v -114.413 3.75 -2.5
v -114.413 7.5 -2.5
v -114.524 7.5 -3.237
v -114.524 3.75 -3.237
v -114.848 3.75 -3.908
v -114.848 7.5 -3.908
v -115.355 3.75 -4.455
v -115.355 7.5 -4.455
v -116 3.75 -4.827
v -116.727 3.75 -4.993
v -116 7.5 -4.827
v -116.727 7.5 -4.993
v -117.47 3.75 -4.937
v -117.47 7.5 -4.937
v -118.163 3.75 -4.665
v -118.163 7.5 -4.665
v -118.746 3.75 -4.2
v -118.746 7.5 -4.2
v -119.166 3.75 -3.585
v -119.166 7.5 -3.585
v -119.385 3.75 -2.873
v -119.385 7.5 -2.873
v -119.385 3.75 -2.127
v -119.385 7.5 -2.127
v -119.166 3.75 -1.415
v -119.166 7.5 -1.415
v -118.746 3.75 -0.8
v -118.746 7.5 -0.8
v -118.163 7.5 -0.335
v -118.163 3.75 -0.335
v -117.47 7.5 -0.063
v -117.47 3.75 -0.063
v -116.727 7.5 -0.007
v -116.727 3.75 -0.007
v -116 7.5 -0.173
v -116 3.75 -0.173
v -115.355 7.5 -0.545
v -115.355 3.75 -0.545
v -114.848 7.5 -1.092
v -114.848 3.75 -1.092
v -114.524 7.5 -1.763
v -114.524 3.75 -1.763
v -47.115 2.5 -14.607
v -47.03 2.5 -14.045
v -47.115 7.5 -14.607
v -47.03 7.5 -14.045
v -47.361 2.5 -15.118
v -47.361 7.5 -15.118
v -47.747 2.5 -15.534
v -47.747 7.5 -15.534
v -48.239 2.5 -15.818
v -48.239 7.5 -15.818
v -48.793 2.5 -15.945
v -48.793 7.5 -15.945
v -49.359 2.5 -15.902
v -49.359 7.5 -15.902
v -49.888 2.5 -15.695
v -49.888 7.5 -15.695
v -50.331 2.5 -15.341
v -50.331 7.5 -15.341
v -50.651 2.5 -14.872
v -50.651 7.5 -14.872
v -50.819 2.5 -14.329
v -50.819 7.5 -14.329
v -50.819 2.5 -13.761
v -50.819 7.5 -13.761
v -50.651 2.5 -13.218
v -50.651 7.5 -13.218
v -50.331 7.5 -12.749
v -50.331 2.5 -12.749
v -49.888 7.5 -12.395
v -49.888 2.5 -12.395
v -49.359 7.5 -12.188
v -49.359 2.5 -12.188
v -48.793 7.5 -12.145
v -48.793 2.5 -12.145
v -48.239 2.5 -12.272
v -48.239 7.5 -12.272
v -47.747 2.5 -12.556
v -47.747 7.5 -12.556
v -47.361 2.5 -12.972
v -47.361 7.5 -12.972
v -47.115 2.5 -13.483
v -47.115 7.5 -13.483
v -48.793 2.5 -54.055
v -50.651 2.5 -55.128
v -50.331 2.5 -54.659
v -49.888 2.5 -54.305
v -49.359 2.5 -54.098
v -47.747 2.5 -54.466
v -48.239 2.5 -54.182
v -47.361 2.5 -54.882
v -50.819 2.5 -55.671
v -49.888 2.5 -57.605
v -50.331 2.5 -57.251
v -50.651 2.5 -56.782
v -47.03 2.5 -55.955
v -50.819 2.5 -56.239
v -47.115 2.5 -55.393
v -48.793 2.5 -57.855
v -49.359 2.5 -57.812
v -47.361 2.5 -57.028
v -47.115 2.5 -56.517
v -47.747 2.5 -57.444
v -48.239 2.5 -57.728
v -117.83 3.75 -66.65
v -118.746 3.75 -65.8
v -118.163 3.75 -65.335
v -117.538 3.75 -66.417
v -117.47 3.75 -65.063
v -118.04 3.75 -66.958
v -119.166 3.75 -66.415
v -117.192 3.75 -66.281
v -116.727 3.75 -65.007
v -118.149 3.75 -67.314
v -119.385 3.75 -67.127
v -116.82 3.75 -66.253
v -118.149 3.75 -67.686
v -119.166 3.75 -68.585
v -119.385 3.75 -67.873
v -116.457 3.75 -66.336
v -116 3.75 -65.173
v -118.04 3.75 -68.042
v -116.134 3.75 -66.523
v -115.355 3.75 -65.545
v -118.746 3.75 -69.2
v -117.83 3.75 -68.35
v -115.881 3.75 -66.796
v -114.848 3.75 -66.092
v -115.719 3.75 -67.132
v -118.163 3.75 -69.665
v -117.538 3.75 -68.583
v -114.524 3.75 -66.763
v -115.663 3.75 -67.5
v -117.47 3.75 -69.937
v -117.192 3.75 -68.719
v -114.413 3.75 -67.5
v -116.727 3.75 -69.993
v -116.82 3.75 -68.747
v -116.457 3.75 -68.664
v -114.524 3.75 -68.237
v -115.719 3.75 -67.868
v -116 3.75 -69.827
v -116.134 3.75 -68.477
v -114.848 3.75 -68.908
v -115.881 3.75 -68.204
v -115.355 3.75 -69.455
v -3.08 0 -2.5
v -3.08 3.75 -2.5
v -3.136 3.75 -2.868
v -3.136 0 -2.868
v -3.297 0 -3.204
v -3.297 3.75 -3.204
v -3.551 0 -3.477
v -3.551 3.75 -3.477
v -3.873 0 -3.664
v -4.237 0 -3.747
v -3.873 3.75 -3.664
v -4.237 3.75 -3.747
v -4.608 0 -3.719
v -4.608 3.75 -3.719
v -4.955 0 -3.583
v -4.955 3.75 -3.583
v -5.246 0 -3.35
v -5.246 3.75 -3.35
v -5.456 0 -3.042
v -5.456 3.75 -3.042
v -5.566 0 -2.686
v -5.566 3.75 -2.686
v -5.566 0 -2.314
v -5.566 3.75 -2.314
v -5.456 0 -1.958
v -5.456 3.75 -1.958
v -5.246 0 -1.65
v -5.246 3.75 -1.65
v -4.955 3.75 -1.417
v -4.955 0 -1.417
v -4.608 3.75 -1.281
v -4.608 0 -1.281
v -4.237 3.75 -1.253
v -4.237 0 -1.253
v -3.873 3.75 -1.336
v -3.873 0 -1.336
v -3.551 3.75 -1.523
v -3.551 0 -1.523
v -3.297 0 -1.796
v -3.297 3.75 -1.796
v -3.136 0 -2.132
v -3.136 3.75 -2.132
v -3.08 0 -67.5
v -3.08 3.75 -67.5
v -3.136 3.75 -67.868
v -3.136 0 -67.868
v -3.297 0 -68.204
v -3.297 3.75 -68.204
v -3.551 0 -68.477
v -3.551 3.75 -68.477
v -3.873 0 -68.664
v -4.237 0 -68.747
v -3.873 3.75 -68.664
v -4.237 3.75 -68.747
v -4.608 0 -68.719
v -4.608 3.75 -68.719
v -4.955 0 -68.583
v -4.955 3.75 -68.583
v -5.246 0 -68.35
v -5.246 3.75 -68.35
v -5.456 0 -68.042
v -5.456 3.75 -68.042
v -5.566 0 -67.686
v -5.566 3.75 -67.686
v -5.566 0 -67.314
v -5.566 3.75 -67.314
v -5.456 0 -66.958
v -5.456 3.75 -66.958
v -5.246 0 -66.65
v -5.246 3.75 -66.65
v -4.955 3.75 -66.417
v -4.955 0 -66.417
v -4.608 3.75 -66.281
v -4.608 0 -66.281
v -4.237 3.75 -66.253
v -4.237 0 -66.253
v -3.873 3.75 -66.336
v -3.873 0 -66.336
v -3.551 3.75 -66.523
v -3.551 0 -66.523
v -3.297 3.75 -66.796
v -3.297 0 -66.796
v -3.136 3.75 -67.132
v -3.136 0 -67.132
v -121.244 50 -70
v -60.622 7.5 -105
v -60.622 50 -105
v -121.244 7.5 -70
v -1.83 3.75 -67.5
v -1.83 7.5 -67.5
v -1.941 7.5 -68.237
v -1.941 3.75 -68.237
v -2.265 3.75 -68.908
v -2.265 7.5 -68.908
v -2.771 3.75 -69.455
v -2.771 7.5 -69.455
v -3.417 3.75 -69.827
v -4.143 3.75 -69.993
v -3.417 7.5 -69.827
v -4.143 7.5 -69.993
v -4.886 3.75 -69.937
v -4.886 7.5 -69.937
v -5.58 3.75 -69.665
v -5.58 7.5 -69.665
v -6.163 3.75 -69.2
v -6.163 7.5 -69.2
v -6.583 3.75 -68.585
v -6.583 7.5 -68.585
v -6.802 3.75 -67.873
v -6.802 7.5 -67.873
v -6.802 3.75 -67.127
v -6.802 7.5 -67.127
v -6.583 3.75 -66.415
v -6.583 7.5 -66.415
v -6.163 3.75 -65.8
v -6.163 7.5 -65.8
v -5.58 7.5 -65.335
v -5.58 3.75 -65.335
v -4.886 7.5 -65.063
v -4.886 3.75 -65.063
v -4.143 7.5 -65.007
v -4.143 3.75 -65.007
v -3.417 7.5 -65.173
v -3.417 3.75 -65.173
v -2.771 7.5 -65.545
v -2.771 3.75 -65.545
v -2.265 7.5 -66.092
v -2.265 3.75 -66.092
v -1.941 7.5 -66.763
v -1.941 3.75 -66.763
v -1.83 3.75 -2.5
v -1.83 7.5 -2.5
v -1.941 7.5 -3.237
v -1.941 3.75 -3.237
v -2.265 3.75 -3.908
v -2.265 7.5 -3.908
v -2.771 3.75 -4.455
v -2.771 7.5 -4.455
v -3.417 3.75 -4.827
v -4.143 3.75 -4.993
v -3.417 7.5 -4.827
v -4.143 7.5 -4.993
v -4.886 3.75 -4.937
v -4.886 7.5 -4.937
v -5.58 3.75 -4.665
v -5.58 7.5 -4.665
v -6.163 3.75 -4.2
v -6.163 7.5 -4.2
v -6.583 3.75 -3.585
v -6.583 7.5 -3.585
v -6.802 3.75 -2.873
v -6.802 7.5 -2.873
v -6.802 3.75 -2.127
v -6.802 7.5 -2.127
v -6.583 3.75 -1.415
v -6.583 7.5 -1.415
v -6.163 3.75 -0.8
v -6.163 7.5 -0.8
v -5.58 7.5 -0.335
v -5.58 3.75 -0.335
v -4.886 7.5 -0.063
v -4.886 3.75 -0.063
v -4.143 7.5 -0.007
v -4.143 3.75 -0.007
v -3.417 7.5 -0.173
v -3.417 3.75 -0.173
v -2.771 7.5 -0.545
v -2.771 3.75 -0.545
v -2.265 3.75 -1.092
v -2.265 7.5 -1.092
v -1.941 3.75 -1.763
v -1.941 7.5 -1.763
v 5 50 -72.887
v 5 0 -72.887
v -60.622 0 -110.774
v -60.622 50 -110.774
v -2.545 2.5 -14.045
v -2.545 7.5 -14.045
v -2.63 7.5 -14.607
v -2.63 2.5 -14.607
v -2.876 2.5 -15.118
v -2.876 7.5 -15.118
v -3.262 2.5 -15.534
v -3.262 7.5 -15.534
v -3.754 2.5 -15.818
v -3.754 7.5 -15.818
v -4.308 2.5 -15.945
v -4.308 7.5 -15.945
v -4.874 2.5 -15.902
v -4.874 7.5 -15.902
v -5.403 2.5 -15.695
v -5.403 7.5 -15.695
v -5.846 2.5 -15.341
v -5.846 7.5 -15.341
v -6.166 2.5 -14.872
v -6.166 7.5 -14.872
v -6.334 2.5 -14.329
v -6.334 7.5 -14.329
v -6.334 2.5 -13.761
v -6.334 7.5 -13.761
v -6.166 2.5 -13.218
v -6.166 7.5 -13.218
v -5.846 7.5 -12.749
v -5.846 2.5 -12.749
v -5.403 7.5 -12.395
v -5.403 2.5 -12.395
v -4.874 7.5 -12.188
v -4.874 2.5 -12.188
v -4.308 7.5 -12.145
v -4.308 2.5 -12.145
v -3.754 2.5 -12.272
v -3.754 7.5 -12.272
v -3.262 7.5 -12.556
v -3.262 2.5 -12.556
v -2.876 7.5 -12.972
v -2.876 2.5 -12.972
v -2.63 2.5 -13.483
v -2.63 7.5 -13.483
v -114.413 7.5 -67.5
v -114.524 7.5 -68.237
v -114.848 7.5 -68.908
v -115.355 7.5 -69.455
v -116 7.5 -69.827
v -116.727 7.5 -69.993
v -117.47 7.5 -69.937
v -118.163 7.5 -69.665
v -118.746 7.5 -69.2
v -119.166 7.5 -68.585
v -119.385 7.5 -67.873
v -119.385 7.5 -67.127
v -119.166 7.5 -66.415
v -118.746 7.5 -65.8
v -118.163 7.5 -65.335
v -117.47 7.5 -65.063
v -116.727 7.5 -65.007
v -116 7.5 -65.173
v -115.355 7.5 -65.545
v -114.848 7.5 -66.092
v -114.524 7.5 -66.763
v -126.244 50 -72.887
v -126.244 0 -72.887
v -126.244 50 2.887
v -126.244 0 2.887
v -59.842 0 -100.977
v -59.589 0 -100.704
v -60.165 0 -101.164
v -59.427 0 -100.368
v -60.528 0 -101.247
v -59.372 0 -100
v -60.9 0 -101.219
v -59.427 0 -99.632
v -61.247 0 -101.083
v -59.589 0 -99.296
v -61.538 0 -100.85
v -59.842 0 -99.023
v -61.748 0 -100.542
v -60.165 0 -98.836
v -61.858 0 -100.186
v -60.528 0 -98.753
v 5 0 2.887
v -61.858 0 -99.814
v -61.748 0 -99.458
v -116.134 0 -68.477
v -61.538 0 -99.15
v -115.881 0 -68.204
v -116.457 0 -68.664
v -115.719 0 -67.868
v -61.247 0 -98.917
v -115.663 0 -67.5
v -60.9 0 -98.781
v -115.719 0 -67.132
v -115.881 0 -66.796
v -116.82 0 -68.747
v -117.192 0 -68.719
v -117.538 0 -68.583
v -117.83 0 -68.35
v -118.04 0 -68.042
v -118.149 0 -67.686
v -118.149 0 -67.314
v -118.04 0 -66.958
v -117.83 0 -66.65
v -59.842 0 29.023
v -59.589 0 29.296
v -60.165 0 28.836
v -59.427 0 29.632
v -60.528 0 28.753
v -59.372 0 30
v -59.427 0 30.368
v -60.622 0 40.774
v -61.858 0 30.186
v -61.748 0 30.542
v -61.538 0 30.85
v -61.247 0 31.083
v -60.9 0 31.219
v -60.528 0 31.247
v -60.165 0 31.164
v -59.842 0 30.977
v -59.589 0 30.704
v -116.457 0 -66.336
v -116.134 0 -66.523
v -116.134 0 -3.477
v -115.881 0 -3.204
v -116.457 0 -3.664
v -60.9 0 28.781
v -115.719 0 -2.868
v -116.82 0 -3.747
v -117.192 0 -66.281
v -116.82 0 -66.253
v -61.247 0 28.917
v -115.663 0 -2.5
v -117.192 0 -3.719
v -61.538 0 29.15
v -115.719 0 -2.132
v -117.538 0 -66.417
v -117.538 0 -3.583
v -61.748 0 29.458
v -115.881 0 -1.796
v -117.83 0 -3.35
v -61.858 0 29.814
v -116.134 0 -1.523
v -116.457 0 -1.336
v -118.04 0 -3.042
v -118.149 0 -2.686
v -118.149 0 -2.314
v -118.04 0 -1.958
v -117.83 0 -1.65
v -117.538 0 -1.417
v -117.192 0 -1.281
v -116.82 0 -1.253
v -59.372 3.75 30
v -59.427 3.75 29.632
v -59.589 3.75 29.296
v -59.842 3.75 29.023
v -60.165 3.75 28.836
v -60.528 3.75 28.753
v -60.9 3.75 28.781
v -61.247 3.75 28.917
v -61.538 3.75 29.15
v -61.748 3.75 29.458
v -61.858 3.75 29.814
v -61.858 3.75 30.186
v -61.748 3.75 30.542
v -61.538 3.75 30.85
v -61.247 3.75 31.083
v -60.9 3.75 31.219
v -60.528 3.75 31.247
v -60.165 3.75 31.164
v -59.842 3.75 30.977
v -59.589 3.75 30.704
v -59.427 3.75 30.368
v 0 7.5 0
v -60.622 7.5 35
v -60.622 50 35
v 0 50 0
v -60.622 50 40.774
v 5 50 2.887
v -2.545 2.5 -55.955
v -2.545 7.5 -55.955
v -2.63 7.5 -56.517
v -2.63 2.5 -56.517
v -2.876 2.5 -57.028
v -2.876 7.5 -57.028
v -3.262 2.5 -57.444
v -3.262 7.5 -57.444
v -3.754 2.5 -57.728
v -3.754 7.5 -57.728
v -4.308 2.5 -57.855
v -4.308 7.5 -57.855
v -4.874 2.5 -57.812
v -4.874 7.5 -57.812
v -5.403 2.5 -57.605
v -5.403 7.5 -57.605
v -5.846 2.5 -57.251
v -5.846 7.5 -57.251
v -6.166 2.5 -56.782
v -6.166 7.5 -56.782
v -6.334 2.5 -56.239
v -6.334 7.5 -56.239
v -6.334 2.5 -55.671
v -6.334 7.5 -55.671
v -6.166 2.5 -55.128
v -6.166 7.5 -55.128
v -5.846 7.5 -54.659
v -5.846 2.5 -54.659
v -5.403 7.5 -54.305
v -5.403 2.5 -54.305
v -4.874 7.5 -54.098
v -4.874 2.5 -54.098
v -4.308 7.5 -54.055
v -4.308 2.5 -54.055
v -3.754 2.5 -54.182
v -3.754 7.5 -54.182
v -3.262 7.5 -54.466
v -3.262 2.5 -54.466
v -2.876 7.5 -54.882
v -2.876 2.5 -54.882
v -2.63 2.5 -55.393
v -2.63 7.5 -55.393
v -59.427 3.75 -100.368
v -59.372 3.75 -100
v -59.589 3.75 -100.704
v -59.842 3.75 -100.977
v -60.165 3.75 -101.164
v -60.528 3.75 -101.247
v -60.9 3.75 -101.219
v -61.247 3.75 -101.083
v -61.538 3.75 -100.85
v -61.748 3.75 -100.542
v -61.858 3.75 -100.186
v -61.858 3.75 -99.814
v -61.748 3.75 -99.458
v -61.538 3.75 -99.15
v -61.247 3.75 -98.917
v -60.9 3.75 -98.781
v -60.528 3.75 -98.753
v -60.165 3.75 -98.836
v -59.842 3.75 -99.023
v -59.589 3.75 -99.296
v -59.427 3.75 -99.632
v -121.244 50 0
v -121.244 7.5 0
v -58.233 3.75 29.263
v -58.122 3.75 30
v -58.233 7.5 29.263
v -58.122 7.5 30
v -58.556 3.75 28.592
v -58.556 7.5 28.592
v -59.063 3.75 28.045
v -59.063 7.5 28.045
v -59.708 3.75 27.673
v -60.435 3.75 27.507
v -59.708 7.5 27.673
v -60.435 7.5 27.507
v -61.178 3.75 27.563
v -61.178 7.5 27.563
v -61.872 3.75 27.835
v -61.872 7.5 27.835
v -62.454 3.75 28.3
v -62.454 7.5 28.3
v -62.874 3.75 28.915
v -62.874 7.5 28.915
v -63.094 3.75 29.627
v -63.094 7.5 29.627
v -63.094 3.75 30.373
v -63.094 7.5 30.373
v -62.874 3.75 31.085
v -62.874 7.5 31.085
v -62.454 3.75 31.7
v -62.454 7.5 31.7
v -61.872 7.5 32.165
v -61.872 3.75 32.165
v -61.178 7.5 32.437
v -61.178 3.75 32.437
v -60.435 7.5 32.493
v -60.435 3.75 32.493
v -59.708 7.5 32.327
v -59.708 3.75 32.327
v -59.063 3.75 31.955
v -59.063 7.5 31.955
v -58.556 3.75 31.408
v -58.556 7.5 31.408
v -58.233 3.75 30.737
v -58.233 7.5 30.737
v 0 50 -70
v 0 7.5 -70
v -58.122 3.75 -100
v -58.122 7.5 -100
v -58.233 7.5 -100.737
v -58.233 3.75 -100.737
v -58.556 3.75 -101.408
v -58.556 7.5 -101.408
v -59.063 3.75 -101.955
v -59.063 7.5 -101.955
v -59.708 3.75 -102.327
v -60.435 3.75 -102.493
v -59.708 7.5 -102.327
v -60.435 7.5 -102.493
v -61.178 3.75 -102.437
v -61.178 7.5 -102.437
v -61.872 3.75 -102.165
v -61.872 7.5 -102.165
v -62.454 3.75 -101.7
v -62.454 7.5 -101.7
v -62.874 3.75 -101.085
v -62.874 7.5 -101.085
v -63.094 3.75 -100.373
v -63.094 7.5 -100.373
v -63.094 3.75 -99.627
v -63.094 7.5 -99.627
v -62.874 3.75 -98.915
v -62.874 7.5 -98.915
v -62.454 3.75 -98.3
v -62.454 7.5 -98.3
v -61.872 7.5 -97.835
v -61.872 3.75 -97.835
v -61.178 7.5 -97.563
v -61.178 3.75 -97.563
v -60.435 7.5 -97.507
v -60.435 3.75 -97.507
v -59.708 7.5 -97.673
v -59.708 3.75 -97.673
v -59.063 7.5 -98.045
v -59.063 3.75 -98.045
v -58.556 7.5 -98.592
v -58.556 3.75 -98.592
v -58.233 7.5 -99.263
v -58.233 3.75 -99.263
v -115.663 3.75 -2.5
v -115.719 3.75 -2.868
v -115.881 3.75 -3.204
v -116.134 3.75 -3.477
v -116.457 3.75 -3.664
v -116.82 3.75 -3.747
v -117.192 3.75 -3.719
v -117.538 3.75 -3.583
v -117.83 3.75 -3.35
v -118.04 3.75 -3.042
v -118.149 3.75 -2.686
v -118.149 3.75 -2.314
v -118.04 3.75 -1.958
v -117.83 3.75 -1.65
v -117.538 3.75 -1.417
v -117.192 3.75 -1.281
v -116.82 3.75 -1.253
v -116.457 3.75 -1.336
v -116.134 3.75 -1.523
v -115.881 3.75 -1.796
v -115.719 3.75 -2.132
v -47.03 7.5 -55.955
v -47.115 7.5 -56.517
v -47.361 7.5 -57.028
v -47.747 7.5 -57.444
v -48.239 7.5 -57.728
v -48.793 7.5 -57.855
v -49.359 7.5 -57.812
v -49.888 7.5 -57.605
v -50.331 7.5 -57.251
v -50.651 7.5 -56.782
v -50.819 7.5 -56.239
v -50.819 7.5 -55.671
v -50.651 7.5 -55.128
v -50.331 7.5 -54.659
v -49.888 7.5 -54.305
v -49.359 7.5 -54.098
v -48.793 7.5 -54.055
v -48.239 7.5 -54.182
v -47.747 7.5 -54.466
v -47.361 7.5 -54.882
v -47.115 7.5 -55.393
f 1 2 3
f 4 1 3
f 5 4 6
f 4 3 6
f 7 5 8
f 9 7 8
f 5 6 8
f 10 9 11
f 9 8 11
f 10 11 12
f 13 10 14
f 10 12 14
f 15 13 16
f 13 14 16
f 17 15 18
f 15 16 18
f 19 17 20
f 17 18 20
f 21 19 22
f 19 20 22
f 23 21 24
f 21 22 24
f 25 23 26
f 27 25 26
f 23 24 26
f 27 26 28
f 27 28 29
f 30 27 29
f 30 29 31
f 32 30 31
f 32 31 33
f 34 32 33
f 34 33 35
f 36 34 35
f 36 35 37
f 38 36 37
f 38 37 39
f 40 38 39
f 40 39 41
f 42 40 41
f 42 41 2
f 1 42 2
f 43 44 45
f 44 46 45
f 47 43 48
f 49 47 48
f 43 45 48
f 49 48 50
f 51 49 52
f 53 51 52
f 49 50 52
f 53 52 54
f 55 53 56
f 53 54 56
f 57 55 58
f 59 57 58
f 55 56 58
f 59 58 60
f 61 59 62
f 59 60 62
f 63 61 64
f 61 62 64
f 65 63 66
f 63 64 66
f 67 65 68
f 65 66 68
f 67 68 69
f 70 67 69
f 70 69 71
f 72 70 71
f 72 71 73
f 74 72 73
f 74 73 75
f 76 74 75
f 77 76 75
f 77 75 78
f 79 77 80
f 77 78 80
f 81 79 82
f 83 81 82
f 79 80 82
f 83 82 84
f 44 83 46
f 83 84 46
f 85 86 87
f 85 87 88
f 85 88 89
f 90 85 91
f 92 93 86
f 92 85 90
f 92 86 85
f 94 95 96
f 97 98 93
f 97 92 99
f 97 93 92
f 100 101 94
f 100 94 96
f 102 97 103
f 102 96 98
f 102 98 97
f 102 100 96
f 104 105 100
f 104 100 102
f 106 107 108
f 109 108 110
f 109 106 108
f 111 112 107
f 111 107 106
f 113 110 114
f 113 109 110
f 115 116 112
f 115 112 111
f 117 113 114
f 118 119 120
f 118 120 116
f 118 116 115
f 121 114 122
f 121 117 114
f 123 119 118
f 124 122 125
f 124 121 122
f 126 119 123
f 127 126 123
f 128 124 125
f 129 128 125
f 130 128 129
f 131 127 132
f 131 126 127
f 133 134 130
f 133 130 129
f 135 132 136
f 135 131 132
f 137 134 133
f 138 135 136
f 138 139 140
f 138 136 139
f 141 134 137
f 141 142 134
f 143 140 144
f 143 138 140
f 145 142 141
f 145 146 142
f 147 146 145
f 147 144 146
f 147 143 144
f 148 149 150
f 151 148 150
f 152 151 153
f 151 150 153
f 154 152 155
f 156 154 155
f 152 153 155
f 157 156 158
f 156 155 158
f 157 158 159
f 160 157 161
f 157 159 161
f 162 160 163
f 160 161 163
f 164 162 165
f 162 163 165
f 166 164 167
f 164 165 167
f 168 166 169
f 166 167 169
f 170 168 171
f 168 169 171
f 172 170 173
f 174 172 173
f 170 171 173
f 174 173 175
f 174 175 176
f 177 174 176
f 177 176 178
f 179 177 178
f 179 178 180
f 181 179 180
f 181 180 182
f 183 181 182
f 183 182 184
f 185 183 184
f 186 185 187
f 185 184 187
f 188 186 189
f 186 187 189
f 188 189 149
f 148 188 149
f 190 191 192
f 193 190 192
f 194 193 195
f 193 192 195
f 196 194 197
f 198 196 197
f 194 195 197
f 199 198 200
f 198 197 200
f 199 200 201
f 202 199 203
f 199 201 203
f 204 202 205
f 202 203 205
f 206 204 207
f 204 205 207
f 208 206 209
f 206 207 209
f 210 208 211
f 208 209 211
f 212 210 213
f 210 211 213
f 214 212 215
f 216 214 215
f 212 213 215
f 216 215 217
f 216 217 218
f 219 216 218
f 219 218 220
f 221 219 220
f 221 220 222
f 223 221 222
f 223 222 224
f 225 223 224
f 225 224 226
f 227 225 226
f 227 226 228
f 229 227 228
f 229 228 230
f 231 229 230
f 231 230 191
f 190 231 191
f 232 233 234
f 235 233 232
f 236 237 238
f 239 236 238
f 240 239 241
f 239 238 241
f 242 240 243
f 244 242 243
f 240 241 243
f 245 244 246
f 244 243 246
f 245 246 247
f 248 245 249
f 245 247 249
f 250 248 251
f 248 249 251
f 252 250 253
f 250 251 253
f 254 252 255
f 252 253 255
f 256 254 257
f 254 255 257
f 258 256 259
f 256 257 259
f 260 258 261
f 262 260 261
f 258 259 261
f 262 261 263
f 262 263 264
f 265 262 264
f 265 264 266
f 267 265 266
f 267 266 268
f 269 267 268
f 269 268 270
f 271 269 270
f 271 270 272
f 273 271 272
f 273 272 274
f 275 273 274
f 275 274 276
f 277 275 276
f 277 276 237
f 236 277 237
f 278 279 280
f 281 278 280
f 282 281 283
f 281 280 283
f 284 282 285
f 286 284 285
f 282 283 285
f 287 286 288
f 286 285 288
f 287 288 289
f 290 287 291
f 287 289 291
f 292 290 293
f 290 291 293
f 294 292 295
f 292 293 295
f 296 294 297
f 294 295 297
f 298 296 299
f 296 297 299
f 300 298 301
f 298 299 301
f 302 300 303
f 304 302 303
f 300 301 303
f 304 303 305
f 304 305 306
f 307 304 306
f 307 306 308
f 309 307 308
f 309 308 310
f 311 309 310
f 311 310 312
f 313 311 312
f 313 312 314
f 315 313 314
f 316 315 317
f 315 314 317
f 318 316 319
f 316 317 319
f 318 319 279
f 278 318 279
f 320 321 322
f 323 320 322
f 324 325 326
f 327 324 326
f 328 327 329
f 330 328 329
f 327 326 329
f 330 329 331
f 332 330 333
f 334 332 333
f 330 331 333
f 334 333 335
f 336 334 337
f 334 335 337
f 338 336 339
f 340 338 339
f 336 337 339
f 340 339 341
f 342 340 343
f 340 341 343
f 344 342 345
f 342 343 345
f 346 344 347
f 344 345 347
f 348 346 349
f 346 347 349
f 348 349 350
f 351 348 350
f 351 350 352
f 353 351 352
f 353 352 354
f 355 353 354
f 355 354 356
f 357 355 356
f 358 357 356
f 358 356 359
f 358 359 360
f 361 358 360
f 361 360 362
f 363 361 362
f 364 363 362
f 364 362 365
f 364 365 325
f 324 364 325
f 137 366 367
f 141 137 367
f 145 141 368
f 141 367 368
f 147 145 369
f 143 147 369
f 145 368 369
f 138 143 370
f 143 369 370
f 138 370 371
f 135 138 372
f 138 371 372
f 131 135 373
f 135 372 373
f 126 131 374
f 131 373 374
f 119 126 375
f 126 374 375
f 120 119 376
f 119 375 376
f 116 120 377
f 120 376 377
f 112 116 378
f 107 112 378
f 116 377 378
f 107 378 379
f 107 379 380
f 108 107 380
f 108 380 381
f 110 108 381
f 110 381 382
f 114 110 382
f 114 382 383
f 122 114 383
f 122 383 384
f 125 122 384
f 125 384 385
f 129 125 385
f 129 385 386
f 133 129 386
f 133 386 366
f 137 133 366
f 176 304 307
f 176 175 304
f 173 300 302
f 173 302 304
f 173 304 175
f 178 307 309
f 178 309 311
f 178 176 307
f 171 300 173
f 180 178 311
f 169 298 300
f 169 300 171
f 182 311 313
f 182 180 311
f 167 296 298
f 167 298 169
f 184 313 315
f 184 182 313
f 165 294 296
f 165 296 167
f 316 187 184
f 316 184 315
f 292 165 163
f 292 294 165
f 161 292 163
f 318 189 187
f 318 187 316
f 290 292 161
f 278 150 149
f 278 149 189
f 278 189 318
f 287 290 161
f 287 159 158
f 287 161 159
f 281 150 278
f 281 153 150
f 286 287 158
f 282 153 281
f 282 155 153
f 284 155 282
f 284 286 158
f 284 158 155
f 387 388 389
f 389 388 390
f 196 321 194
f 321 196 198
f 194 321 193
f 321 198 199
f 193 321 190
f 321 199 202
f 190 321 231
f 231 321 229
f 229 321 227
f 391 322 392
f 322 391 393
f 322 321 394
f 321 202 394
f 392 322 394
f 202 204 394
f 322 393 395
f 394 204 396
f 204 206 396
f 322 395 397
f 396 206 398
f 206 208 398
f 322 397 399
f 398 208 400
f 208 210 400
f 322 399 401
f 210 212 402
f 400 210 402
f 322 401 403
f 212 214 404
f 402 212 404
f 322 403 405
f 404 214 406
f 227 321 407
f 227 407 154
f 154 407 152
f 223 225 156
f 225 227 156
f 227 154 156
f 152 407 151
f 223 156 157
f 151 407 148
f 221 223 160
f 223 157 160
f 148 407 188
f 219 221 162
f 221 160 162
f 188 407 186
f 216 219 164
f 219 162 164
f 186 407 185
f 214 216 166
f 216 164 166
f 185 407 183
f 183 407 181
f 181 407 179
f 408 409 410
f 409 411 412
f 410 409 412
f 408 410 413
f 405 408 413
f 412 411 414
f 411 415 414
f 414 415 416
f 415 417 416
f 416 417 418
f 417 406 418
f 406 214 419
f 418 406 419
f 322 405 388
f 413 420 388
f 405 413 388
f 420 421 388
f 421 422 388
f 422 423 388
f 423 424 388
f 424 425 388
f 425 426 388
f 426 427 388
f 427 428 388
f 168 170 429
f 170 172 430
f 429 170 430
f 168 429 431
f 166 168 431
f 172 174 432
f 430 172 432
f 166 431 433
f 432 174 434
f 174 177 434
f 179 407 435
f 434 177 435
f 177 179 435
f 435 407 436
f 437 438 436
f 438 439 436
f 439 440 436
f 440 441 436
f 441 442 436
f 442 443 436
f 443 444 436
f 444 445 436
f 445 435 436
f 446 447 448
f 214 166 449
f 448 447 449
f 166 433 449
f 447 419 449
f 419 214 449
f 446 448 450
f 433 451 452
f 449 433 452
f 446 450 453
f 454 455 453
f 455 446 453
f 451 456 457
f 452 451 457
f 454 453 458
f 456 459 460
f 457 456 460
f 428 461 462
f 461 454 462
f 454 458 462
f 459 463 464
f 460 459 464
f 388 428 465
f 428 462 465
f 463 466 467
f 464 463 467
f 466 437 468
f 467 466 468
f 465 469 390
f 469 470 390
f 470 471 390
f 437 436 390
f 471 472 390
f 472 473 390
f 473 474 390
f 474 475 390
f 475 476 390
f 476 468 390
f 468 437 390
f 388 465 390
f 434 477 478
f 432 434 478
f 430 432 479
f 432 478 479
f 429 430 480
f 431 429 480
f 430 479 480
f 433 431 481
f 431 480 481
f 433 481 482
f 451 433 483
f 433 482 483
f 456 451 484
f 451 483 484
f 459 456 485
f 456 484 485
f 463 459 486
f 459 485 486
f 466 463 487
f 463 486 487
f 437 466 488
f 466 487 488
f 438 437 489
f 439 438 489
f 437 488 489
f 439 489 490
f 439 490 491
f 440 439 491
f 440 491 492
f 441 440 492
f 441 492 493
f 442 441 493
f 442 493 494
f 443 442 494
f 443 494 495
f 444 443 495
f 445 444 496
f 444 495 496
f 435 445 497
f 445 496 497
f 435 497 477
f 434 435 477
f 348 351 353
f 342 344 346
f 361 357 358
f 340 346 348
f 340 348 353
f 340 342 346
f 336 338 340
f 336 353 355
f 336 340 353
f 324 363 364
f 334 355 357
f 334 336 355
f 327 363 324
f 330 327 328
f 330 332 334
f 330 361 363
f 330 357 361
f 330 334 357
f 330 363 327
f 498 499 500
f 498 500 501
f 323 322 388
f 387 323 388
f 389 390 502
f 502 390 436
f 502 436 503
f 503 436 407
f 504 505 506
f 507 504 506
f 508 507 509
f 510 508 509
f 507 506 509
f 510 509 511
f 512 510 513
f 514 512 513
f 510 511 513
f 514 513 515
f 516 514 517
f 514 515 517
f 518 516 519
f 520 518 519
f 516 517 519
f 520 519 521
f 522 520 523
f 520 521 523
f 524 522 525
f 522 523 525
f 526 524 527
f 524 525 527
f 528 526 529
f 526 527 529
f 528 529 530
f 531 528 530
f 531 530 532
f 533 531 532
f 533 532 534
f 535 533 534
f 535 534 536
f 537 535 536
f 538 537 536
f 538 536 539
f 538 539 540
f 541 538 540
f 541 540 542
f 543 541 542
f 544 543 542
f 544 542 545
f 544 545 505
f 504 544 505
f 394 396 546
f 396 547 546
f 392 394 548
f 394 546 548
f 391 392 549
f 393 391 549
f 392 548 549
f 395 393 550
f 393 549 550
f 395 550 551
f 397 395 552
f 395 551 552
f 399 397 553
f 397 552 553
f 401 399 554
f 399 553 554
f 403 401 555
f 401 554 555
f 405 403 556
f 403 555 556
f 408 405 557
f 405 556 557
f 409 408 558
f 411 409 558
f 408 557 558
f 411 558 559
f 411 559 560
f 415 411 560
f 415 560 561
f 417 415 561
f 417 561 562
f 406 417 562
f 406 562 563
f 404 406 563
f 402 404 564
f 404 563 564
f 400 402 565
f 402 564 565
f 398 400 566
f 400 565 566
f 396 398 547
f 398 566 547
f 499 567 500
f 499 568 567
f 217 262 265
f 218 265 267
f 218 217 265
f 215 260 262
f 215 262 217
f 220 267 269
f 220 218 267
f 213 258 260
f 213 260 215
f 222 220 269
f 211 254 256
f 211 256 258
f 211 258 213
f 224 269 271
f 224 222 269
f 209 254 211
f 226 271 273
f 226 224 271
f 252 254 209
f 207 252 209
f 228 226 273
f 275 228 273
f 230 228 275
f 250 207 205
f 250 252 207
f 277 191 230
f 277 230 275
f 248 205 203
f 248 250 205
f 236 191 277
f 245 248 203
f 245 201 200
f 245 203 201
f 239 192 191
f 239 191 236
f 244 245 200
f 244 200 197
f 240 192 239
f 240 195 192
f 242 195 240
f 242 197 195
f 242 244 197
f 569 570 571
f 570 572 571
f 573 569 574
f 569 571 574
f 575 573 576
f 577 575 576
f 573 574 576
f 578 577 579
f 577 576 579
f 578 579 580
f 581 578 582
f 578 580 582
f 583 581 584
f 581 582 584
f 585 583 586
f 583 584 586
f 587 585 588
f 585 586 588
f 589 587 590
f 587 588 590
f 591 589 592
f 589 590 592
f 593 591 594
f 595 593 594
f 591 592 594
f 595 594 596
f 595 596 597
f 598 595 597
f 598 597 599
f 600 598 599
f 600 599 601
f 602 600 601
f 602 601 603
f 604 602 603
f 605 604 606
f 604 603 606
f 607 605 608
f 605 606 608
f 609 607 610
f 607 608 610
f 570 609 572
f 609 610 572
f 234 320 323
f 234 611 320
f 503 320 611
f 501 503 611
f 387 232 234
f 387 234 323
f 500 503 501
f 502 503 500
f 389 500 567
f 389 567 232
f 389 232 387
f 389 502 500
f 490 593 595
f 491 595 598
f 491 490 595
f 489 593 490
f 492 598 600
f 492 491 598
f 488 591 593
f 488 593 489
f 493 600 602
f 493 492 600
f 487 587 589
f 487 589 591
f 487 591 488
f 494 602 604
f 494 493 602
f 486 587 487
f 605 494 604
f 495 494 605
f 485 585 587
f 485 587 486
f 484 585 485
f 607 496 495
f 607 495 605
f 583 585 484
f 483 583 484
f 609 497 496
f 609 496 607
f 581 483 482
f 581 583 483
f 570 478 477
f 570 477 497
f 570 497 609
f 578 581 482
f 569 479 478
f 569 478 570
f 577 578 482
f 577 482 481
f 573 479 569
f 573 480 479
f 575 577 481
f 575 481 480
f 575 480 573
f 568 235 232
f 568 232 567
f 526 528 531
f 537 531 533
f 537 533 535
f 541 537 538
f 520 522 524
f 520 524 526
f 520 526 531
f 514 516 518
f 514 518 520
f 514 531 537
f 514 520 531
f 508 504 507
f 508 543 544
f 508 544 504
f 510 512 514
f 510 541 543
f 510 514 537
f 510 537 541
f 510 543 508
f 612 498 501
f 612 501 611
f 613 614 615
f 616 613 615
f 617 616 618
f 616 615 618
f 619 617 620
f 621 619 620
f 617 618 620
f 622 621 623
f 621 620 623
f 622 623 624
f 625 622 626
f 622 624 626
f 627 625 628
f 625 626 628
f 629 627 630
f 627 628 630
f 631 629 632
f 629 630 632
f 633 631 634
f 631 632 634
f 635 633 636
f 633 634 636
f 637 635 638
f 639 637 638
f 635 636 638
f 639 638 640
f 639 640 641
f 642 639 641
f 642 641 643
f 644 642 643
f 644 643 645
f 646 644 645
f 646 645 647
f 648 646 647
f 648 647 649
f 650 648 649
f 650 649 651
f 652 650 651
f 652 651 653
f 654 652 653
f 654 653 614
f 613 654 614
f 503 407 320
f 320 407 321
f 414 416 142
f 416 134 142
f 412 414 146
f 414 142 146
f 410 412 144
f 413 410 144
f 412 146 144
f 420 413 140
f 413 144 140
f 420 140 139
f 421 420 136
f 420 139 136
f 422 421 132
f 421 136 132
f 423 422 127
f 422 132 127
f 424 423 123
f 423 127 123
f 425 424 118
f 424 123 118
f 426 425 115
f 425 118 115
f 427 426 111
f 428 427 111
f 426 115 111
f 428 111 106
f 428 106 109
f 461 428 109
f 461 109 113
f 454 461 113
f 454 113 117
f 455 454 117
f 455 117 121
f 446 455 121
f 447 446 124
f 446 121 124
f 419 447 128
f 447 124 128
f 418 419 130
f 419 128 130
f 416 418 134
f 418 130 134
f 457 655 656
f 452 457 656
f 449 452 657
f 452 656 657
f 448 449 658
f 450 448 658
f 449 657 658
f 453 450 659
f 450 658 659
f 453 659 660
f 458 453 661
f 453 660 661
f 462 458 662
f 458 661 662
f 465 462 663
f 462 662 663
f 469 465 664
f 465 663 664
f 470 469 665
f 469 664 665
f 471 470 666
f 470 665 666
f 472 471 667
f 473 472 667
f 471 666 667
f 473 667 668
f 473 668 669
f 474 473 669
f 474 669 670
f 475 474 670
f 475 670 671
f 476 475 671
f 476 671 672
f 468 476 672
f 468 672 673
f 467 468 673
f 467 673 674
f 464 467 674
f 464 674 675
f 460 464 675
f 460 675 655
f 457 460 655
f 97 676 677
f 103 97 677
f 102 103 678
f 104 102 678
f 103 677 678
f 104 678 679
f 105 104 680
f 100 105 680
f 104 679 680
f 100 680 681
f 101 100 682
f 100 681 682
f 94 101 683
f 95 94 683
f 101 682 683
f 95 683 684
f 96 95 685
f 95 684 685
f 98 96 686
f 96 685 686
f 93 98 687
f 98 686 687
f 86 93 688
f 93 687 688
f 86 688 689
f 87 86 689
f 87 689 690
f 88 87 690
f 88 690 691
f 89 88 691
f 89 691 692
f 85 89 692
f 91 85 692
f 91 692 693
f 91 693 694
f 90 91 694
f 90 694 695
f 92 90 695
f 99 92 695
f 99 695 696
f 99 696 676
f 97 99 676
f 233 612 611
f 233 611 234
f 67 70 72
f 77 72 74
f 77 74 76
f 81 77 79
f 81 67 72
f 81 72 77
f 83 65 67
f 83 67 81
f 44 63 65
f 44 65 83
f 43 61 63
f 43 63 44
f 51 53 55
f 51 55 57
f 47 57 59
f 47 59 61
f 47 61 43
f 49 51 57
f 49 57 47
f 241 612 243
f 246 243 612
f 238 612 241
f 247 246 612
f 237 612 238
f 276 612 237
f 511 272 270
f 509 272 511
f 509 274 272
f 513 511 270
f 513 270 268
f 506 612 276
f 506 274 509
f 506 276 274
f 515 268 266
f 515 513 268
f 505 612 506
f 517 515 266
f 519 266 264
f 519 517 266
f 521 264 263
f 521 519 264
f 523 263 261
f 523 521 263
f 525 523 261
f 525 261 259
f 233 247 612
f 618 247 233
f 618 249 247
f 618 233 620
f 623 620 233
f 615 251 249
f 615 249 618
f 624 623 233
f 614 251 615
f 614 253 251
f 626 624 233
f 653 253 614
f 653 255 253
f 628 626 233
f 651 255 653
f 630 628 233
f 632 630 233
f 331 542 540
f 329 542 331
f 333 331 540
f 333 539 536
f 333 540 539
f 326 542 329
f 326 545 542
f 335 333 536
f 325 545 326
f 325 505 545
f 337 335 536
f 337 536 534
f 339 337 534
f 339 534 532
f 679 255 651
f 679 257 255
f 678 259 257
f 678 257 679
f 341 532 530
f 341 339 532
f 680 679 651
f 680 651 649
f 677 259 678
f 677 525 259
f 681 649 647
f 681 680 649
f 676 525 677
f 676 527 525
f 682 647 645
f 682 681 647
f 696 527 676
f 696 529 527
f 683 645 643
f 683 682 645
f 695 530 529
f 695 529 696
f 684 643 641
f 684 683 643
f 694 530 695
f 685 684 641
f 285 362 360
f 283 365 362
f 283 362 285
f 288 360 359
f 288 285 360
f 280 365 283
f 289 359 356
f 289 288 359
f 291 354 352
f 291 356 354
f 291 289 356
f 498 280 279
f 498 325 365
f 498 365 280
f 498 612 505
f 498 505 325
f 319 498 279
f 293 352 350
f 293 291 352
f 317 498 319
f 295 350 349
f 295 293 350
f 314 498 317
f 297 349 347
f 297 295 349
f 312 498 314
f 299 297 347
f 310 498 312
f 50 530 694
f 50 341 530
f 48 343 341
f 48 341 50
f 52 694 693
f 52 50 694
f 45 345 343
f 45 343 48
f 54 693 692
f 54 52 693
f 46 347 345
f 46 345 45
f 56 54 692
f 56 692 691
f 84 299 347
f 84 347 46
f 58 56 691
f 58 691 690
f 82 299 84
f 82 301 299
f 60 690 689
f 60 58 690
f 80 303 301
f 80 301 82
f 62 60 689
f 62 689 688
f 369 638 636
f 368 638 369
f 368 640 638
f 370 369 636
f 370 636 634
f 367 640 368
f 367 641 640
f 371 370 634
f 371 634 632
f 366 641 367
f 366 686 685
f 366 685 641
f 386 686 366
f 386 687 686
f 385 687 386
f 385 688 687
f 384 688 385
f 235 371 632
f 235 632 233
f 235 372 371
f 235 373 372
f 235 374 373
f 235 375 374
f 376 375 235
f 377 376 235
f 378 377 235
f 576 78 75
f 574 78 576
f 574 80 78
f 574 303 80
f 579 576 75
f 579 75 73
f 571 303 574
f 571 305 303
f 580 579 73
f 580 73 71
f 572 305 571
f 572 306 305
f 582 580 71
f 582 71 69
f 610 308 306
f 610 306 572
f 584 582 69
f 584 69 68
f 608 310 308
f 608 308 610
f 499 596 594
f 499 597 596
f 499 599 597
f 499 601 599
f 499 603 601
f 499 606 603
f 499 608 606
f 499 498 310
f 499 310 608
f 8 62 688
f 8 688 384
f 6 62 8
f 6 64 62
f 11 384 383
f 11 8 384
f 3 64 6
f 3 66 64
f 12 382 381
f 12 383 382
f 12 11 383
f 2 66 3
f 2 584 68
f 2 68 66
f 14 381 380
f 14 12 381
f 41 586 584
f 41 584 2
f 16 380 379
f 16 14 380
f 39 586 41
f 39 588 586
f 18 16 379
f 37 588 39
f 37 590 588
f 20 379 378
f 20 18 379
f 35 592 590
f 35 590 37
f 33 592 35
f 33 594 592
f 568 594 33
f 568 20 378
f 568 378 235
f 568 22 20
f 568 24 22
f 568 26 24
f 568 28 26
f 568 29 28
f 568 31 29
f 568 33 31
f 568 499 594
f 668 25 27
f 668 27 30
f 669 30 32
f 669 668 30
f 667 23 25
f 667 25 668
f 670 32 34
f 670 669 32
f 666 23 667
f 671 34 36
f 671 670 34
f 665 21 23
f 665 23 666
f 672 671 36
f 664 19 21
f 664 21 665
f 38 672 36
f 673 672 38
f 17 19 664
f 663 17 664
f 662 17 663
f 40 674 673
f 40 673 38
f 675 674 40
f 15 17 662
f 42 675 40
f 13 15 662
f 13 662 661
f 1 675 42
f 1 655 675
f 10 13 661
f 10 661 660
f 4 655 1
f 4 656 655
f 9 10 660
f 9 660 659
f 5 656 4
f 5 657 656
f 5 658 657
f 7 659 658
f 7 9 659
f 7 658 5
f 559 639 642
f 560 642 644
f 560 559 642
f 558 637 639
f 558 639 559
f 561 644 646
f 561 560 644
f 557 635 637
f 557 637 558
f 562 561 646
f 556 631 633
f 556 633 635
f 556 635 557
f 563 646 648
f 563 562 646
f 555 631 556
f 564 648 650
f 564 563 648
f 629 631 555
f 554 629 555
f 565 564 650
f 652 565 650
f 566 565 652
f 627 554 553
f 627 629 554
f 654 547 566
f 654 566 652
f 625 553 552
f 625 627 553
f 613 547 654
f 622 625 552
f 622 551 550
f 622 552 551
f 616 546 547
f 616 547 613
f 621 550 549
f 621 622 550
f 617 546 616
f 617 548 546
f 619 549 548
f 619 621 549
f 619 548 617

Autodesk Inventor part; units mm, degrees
ref_plane "YZ Plane" through (0, 0, 0) normal (1, 0, 0) x (0, 1, 0)
ref_plane "XZ Plane" through (0, 0, 0) normal (0, 1, 0) x (-1, 0, 0)
ref_plane "XY Plane" through (0, 0, 0) normal (0, 0, 1) x (1, 0, 0)
sketch "Sketch1" plane through (0, 0, 0) normal (0, 1, 0) x (-1, 0, 0)
  line L0 (0, 0) -> (0, -70)
  line L1 (0, -70) -> (60.6218, -105)
  line L2 (60.6218, -105) -> (121.2436, -70)
  line L3 (121.2436, -70) -> (121.2436, 0)
  line L4 (121.2436, 0) -> (60.6218, 35)
  line L5 (60.6218, 35) -> (0, 0)
  line L6 (-5, 2.8868) -> (-5, -72.8868)
  line L7 (-5, -72.8868) -> (60.6218, -110.7735)
  line L8 (60.6218, -110.7735) -> (126.2436, -72.8868)
  line L9 (126.2436, -72.8868) -> (126.2436, 2.8868)
  line L10 (126.2436, 2.8868) -> (60.6218, 40.7735)
  line L11 (60.6218, 40.7735) -> (-5, 2.8868)
  line L12 (0, 0) -> (-5, 0) construction
  line L13 (-5, 2.8868) -> (0, 0) construction
  dimension "wall" = 70
  dimension "d1" = 70
  dimension "d2" = 70
  dimension "d3" = 70
  dimension "d4" = 70
  dimension "d5" = 70
  dimension "d6" = 120
  dimension "d7" = 120
  dimension "d9" = 120
  dimension "d10" = 120
  dimension "d11" = 120
  dimension "wallThickness" = 5
  dimension "d15" = 5
  dimension "d16" = 131.2436
extrude "Extrusion1" add sketch "Sketch1" along normal blind 7.5 contours L5 L4 L3 L2 L1 L0
extrude "Extrusion2" add sketch "Sketch1" along normal blind 50
sketch "Sketch2" plane through (0, 7.5, 0) normal (0, 1, 0) x (1, 0, 0)
  circle A0 centre (-4.45, 55.955) radius 1.905
  circle A1 centre (-4.45, 14.045) radius 1.905
  line L0 (-4.45, 55.955) -> (-4.45, 14.045) construction
  line L1 (0, 70) -> (0, 0) construction
  line L2 (-4.45, 14.045) -> (-48.935, 14.045) construction
  circle A2 centre (-48.935, 14.045) radius 1.905
  circle A3 centre (-48.935, 55.955) radius 1.905
  line L3 (0, 70) -> (-60.6218, 105) projected
  line L4 (0, 70) -> (-1, 70) construction
  dimension "holderRadius" = 3.81
  dimension "d22" = 3.81
  dimension "d23" = 41.91
  dimension "d24" = 4.45
  dimension "d25" = 44.485
  dimension "d26" = 3.81
  dimension "d27" = 3.81
  dimension "d28" = 41.91
  dimension "d29" = 44.485
  dimension "d30" = 1
  dimension "d31" = 14.045
extrude "Extrusion3" cut sketch "Sketch2" against normal blind 5
sketch "Sketch3" plane through (0, 7.5, 0) normal (0, 1, 0) x (1, 0, 0)
  circle A0 centre (-4.3301, 2.5) radius 2.5
  line L0 (0, 0) -> (0, 70) projected
  line L1 (0, 0) -> (-4.3301, 2.5) construction
  line L2 (0, 0) -> (5, 0) construction
  line L3 (-60.6218, -35) -> (-121.2436, 0) construction
  line L4 (-60.6218, -35) -> (-60.6218, -30) construction
  line L5 (-60.6218, -35) -> (-55.6218, -35) construction
  line L6 (-121.2436, 70) -> (-121.2436, 0) construction
  line L7 (-121.2436, 0) -> (-116.9134, 2.5) construction
  line L8 (-121.2436, 0) -> (-116.2436, 0) construction
  line L9 (-60.6218, 105) -> (-60.6218, 100) construction
  line L10 (0, 70) -> (-4.3301, 67.5) construction
  circle A1 centre (-4.3301, 67.5) radius 2.5
  line L11 (-121.2436, 70) -> (-60.6218, 105) construction
  circle A2 centre (-116.9134, 2.5) radius 2.5
  line L12 (-121.2436, 70) -> (-116.9134, 67.5) construction
  circle A3 centre (-116.9134, 67.5) radius 2.5
  circle A4 centre (-60.6218, 100) radius 2.5
  circle A5 centre (-60.6218, -30) radius 2.5
  circle A6 centre (-60.6218, -30) radius 1.25
  circle A7 centre (-116.9134, 2.5) radius 1.25
  circle A8 centre (-116.9134, 67.5) radius 1.25
  circle A9 centre (-60.6218, 100) radius 1.25
  circle A10 centre (-4.3301, 67.5) radius 1.25
  circle A11 centre (-4.3301, 2.5) radius 1.25
  dimension "holeRad" = 5
  dimension "d35" = 5
  dimension "d36" = 150
  dimension "d37" = 5
  dimension "d38" = 90
  dimension "d39" = 5
  dimension "d40" = 30
  dimension "d42" = 5
  dimension "d43" = 5
  dimension "d44" = 5
  dimension "d45" = 60
  dimension "d47" = 5
  dimension "d48" = 5
  dimension "d49" = 60
  dimension "d50" = 5
  dimension "d51" = 5
  dimension "d52" = 5
  dimension "d53" = 2.5
  dimension "d54" = 2.5
  dimension "d55" = 2.5
  dimension "d56" = 2.5
  dimension "d57" = 2.5
  dimension "d58" = 2.5
extrude "Extrusion4" cut sketch "Sketch3" against normal blind 3.75
extrude "Extrusion5" cut sketch "Sketch3" against normal blind 7.5 contours A6 | A7 | A8 | A9 | A10 | A11
equation "\"d1\" = wall"
equation "\"d2\" = wall"
equation "\"d3\" = wall"
equation "\"d4\" = wall"
equation "\"d5\" = wall"
properties part number "Improved Internal Base"
